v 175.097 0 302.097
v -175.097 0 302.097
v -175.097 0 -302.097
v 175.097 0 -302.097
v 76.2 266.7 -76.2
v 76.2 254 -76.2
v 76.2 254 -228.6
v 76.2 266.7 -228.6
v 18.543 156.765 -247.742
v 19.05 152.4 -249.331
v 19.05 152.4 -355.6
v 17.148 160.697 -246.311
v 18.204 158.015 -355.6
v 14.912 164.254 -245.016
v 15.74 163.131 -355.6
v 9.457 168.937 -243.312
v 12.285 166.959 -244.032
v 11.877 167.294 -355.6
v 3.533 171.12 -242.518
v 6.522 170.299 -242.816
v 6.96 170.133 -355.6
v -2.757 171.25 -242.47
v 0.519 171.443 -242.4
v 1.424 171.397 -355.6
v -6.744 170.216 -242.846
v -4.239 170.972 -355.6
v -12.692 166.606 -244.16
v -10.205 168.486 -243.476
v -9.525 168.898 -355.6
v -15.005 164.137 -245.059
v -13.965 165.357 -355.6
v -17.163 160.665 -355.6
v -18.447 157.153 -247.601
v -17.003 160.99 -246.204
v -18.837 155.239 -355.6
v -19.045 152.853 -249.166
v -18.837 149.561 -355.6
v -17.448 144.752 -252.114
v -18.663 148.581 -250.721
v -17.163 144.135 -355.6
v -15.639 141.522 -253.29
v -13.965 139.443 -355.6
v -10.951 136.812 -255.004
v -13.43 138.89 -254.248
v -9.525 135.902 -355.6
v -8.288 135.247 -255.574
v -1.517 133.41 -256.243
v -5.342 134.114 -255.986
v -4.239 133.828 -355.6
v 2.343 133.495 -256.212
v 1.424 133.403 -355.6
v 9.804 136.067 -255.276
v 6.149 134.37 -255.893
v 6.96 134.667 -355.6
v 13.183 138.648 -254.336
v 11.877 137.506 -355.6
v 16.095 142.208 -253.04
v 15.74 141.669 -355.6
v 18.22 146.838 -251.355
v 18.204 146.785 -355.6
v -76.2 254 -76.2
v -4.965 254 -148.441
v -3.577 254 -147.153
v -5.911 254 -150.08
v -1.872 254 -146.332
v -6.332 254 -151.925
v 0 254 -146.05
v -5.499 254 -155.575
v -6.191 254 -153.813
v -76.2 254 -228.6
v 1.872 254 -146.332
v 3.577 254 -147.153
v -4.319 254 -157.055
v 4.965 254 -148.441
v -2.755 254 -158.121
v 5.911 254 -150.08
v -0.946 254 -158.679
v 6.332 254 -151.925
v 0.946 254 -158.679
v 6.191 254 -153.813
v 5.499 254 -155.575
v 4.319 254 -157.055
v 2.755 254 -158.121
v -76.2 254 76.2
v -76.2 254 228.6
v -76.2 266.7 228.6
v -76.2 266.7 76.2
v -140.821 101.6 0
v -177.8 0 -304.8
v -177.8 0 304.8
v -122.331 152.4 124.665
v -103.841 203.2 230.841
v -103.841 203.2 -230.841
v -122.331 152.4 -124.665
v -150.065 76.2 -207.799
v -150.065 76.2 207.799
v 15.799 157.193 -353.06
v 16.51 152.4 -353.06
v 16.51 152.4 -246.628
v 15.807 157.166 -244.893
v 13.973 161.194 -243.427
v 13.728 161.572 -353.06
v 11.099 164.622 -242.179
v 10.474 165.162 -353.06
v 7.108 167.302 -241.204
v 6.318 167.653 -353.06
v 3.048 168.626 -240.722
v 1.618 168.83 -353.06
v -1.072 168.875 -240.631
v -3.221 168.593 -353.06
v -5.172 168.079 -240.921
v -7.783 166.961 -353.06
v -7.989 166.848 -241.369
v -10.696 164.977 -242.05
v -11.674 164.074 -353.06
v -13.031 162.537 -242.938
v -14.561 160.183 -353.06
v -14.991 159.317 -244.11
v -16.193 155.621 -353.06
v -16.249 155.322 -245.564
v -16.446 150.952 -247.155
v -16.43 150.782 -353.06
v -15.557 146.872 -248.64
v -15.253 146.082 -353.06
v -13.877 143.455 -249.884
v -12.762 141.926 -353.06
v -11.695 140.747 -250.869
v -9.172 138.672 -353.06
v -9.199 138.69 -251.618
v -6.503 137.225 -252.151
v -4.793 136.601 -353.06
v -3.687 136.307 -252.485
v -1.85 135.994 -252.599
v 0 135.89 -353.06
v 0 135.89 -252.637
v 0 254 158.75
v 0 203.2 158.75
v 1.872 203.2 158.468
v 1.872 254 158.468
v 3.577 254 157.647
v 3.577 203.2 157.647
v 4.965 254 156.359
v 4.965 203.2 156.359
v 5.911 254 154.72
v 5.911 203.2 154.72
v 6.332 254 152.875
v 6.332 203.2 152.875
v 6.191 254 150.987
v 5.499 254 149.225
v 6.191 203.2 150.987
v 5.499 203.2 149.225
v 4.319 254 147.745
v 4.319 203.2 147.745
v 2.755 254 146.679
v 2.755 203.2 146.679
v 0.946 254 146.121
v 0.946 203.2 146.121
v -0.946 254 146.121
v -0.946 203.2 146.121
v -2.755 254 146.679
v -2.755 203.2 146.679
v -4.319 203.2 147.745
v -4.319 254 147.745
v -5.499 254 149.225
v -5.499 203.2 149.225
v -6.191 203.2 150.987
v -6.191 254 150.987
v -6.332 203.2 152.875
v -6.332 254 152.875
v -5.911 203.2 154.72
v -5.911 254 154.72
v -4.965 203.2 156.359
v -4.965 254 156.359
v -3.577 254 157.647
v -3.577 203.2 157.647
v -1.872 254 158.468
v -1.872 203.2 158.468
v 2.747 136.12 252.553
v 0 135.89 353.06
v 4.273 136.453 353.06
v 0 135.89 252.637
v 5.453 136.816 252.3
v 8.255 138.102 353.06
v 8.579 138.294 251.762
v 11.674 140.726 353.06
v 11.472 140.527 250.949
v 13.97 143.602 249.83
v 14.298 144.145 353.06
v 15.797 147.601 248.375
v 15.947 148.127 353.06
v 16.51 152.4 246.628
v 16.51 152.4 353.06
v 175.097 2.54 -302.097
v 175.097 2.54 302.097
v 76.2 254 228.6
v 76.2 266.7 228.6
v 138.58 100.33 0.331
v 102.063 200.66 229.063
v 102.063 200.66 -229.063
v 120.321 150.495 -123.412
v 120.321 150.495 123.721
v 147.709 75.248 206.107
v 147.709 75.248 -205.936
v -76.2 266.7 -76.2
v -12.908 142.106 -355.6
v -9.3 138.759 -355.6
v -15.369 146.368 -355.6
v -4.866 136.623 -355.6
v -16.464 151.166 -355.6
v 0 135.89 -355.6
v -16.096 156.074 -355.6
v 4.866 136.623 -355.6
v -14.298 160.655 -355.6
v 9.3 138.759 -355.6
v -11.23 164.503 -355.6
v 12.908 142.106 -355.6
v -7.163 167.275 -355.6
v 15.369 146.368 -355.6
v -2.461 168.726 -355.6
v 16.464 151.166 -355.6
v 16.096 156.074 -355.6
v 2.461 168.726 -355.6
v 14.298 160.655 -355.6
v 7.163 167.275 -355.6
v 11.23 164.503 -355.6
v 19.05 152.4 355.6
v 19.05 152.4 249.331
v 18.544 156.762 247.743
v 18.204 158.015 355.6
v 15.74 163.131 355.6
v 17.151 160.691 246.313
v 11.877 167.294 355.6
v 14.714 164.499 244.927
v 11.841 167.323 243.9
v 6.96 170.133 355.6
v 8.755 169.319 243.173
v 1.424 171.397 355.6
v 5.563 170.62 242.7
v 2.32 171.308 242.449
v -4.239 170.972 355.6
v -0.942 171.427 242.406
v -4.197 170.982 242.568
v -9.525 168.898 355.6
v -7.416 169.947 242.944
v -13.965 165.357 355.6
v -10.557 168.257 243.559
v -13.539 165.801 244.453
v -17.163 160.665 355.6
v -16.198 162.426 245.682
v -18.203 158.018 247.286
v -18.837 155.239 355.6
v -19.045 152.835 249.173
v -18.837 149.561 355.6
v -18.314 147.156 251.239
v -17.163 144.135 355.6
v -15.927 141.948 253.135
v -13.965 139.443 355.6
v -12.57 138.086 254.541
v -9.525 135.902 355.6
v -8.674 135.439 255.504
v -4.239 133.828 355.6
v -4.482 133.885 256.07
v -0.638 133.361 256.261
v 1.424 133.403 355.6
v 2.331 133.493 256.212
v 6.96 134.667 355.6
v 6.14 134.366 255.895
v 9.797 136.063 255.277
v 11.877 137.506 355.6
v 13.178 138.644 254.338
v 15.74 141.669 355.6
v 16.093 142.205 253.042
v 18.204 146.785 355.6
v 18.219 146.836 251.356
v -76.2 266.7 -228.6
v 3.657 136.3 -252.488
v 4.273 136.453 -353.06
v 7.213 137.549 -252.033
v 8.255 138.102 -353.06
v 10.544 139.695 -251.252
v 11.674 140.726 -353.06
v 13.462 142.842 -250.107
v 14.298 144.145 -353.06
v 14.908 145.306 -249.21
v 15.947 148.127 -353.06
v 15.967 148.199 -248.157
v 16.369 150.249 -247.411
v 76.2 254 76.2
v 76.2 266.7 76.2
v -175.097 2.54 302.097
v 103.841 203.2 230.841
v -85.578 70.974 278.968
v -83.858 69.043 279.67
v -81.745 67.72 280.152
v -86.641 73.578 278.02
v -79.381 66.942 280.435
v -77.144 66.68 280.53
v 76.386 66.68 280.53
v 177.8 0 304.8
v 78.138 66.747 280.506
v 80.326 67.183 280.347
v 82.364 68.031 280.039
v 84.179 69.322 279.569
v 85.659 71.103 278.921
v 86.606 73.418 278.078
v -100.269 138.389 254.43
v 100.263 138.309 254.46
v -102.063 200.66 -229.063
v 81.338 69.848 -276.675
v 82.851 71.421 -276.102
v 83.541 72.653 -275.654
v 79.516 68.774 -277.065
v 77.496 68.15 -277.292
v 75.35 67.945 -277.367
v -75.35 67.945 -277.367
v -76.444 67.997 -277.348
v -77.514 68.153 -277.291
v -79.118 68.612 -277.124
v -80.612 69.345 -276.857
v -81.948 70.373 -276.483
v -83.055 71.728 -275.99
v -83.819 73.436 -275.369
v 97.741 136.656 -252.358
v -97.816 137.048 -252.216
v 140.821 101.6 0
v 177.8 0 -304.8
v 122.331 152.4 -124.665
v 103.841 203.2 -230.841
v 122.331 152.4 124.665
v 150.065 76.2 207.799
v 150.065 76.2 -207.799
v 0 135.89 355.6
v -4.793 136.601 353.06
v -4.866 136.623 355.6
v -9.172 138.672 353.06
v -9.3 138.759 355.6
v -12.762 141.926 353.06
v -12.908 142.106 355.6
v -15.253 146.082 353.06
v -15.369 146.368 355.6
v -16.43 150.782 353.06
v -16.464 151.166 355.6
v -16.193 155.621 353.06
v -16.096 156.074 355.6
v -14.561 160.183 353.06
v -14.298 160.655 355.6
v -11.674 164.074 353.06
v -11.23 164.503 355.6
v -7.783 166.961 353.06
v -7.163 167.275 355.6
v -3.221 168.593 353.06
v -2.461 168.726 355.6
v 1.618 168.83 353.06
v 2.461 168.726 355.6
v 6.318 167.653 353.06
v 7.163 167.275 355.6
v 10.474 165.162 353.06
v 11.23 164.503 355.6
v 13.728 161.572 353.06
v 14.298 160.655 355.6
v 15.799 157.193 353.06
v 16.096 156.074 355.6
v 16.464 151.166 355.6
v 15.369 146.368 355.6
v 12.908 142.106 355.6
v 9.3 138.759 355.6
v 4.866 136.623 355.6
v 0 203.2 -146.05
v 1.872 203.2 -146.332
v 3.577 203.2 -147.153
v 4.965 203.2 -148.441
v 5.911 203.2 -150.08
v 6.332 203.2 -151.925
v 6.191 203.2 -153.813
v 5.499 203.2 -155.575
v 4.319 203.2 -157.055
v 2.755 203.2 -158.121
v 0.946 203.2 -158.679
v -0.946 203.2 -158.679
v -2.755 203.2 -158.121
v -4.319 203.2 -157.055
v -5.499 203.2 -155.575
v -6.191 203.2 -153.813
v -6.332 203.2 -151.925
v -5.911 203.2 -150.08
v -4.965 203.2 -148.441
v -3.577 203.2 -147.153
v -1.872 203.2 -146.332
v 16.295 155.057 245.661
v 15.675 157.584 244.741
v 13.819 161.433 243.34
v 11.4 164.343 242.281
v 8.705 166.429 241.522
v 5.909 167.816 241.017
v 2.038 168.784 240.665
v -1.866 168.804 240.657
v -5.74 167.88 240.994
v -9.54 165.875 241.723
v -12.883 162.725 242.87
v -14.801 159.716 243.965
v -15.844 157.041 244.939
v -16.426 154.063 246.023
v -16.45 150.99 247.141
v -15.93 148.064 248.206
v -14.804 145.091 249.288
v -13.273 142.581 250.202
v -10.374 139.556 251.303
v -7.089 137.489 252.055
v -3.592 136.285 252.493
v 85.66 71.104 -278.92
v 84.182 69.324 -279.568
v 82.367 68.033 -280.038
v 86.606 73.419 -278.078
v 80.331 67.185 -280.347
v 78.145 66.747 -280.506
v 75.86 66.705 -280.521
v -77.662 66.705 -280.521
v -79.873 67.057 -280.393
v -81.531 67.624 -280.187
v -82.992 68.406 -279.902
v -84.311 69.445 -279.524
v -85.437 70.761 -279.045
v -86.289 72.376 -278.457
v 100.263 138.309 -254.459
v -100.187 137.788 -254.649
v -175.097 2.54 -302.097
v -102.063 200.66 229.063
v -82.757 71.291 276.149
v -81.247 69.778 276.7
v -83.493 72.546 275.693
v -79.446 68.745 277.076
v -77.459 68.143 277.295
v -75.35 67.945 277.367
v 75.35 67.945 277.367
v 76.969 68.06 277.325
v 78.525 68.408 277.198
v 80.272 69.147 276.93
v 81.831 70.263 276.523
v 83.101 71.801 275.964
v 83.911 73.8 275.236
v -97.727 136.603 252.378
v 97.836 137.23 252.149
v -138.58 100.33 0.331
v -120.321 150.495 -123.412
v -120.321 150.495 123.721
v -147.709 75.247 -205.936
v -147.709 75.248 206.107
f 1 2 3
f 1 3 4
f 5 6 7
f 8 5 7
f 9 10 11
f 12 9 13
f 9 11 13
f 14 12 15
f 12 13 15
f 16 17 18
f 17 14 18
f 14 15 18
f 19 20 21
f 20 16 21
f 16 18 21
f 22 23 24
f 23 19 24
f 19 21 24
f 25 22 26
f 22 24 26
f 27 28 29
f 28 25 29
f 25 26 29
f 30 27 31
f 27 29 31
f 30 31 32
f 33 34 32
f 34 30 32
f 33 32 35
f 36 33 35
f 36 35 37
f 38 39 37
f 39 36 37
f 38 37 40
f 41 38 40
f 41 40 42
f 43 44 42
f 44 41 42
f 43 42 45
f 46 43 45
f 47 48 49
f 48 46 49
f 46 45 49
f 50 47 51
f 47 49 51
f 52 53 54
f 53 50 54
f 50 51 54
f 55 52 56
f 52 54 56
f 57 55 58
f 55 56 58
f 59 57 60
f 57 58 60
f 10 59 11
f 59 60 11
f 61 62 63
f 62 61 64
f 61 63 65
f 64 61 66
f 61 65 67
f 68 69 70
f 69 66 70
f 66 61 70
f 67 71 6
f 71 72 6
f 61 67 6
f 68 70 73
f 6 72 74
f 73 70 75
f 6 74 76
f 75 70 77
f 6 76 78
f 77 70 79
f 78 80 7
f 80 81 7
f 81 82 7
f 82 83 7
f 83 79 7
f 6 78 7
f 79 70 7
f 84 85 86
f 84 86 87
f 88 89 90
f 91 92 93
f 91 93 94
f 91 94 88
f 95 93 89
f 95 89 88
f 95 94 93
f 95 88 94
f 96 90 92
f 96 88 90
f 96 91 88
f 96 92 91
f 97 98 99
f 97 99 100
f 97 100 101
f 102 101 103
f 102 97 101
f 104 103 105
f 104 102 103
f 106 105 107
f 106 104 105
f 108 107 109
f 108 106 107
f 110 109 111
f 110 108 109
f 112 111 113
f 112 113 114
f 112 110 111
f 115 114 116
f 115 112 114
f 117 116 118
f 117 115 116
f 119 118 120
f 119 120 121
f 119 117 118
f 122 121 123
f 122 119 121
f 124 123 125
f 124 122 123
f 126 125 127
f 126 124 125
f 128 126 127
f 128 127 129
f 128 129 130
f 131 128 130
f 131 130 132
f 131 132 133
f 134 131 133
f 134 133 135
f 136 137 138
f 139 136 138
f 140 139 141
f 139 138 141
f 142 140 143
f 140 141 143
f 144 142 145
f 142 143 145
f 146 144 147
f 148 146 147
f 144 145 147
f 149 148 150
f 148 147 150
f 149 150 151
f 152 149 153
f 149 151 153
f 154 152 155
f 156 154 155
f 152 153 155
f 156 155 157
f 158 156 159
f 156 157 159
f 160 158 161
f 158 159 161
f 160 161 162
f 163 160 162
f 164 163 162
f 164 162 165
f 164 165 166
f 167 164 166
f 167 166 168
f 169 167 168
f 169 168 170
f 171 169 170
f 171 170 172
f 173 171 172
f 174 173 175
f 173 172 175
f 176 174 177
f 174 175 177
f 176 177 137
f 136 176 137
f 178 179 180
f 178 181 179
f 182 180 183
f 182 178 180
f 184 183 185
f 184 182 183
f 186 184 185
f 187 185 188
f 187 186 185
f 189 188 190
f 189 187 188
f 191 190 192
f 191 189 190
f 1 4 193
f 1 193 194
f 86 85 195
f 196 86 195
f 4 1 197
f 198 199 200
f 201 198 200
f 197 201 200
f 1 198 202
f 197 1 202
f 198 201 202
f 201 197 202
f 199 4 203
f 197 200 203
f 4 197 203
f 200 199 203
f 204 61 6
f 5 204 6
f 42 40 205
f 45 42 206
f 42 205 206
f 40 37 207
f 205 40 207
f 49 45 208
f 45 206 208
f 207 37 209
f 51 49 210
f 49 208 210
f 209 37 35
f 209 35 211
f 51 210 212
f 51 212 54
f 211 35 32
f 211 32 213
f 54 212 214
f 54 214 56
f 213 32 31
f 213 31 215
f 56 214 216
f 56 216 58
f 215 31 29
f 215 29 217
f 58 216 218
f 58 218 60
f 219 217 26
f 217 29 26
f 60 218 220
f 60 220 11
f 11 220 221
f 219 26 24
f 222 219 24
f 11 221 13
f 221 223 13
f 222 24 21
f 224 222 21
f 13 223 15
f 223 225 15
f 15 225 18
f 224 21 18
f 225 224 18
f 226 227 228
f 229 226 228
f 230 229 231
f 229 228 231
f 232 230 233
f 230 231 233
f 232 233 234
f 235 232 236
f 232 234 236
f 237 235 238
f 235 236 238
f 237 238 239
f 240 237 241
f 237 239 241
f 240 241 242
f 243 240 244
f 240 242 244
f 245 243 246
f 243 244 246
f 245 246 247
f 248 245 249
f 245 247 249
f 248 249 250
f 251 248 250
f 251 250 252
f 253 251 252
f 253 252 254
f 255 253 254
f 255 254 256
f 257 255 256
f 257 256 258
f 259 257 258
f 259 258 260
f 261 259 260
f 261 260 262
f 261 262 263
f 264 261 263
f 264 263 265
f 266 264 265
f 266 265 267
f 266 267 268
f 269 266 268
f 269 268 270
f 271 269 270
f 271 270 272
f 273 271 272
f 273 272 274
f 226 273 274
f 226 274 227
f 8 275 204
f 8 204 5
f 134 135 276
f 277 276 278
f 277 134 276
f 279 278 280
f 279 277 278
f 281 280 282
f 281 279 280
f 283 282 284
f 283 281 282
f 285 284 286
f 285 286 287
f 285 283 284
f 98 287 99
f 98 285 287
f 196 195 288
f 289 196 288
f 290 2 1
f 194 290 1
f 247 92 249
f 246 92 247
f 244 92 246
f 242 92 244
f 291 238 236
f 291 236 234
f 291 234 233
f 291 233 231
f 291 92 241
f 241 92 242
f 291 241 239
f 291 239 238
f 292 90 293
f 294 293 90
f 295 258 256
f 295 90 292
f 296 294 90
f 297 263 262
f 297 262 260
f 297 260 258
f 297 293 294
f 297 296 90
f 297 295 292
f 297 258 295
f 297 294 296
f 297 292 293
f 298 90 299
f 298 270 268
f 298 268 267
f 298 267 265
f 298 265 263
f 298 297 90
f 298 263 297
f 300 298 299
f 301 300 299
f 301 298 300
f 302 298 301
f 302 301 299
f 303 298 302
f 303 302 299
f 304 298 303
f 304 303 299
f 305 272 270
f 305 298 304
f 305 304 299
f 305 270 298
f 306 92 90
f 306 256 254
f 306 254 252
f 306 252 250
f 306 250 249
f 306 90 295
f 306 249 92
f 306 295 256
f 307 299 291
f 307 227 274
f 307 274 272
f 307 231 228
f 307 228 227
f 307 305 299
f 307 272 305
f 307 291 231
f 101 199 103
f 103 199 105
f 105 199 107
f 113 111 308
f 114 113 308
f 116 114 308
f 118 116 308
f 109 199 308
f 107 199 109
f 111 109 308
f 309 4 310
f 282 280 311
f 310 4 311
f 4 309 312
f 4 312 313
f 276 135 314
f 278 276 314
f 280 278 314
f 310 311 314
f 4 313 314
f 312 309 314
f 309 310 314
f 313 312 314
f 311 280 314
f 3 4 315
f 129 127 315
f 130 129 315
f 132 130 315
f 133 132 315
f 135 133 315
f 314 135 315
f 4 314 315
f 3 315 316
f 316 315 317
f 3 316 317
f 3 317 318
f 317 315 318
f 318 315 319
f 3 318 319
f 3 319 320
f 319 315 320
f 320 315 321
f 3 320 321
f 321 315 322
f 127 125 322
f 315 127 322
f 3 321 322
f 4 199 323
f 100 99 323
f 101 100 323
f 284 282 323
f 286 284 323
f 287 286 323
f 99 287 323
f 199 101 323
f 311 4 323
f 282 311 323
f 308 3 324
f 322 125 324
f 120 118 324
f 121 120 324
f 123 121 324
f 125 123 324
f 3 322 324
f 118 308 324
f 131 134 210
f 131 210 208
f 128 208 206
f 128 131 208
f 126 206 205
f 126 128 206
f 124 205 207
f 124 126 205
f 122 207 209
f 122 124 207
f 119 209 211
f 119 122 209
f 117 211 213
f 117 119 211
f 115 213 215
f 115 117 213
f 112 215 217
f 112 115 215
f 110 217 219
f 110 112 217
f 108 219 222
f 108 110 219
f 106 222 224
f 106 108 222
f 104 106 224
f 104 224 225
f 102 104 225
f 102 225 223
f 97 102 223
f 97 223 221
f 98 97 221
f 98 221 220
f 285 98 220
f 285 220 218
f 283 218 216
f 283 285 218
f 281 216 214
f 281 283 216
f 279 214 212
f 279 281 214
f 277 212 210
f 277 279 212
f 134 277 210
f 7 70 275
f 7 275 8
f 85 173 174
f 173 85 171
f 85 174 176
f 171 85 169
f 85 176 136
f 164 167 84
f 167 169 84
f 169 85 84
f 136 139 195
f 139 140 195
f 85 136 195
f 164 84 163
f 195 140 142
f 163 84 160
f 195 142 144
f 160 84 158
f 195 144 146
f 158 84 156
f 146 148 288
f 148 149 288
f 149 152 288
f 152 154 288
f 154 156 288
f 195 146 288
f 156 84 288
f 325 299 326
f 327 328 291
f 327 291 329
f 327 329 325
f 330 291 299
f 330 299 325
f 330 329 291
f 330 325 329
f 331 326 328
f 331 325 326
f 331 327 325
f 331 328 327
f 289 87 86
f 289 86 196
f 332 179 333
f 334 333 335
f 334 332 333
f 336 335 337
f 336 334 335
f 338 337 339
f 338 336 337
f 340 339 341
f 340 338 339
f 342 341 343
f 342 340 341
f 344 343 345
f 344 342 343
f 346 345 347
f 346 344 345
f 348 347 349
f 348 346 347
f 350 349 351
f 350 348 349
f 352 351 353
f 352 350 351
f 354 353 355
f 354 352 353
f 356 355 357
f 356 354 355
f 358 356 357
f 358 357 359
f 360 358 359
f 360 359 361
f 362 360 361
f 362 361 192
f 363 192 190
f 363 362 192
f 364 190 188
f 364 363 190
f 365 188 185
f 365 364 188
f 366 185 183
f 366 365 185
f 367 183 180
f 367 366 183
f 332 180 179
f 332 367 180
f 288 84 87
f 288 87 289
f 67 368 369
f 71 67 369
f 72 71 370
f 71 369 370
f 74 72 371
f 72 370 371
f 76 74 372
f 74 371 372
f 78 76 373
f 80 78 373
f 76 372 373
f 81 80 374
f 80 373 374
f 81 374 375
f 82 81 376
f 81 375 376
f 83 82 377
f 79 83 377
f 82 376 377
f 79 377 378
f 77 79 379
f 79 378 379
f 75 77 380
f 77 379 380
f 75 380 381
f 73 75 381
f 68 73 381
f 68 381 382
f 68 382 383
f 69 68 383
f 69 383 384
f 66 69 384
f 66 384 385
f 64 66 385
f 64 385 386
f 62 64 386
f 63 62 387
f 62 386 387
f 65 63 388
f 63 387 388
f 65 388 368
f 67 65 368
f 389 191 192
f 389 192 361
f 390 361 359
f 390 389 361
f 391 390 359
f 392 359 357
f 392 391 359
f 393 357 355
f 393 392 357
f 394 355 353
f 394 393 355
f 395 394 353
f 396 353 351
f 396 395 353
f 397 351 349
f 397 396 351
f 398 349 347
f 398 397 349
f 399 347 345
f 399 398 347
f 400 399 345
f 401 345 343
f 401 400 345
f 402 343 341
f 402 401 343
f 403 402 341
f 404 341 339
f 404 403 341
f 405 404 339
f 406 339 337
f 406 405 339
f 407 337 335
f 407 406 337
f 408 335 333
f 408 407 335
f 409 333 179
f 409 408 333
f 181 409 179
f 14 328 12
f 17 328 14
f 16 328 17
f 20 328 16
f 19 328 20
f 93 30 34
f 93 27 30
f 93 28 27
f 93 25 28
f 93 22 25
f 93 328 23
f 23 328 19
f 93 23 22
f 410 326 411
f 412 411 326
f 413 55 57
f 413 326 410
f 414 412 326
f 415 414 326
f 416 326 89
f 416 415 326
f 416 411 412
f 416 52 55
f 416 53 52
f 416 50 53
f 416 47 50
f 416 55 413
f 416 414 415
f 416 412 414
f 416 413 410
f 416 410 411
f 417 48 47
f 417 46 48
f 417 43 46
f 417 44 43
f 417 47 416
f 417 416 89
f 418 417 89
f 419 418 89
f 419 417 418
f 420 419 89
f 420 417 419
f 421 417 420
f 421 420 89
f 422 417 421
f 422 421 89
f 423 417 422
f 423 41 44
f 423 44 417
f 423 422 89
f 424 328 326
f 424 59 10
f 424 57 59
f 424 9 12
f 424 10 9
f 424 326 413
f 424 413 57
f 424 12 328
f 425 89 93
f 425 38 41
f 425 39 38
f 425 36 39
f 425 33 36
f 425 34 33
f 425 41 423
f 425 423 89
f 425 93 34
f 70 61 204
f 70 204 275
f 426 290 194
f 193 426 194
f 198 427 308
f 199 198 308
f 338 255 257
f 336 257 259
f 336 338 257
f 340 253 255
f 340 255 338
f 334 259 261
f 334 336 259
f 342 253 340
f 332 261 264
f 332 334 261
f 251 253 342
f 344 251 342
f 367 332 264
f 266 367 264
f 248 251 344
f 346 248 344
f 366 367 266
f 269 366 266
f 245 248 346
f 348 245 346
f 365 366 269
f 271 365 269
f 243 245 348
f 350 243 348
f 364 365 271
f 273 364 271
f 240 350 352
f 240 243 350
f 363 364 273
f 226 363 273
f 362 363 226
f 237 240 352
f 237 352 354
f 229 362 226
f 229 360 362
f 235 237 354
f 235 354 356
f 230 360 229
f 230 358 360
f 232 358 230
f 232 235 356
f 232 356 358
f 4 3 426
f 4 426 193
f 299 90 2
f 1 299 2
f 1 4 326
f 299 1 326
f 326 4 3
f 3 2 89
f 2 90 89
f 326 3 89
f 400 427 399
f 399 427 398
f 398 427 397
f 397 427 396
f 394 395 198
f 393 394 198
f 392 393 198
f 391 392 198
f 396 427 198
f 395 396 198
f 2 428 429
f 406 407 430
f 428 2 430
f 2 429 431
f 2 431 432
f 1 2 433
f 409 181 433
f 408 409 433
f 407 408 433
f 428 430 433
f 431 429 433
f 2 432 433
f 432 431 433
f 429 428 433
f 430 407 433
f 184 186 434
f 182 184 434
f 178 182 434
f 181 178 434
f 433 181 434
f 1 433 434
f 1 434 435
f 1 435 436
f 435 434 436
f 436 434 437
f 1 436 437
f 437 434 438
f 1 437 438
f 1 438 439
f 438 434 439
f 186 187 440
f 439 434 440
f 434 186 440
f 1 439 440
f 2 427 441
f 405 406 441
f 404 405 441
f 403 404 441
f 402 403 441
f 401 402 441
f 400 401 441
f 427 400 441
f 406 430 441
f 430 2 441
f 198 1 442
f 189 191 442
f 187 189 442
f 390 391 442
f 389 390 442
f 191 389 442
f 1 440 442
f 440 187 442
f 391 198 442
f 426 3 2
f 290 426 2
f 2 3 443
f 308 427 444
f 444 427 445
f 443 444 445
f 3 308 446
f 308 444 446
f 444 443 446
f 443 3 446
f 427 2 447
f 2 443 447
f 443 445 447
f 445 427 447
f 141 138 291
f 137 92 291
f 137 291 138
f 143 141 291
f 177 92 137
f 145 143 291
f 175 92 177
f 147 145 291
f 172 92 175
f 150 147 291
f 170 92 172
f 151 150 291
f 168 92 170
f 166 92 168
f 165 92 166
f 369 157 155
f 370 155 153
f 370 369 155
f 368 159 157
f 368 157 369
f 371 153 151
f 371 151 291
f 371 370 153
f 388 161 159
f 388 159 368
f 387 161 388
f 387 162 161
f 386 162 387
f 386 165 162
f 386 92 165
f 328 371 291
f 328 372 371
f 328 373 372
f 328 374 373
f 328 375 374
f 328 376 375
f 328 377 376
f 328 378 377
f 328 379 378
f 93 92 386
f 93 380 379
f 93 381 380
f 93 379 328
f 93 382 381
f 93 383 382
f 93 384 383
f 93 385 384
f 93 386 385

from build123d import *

# Parameters (mm, degrees)
SKETCH1_W                = 355.6
SKETCH1_H                = 609.6
BOSS_EXTRUDE1_DEPTH      = 203.2
BOSS_EXTRUDE1_TAPER      = 20
BOSS_EXTRUDE2_DEPTH      = 355.6
BOSS_EXTRUDE2_DEPTH_BACK = 355.6
SKETCH2_R                = 19.05
SKETCH2_R_2              = 12.7
SHELL1_T                 = -2.54
CUT_EXTRUDE1_DEPTH       = 759.354848219
CUT_EXTRUDE1_DEPTH_BACK  = 759.354848219
SKETCH3_R                = 16.51
SKETCH4_R                = 6.35
BOSS_EXTRUDE3_DEPTH      = 50.8
SKETCH5_W                = 152.4
SKETCH5_H                = 152.4
BOSS_EXTRUDE4_DEPTH      = 12.7
SKETCH6_W                = 350.193976916
SKETCH6_H                = 604.193976916
BOSS_EXTRUDE5_DEPTH      = 2.54


with BuildPart() as part:
    # Sketch1 → Boss-Extrude1 (new body)
    with BuildSketch(Plane(origin=(0, 0, 0), x_dir=(1, 0, 0), z_dir=(0, 1, 0))):
        Rectangle(SKETCH1_W, SKETCH1_H)
    extrude(amount=BOSS_EXTRUDE1_DEPTH, taper=BOSS_EXTRUDE1_TAPER)

    # Sketch2 → Boss-Extrude2 (add, two sides: drawn at the far end of the back side and taken through both)
    with BuildSketch(Plane.XY.offset(-BOSS_EXTRUDE2_DEPTH_BACK)):
        with Locations((0, 152.4)):
            Circle(SKETCH2_R)
        with Locations((0, 152.4)):
            Circle(SKETCH2_R_2, mode=Mode.SUBTRACT)
    extrude(amount=BOSS_EXTRUDE2_DEPTH + BOSS_EXTRUDE2_DEPTH_BACK)

    # Shell1
    shell1_openings = [part.faces().sort_by_distance(p)[0] for p in [
        (0, 0, 0),
    ]]
    offset(amount=SHELL1_T, openings=shell1_openings, kind=Kind.INTERSECTION)

    # Sketch3 → Cut-Extrude1 (cut, two sides: drawn at the far end of the back side and taken through both)
    with BuildSketch(Plane(origin=(0, 0, 353.06), x_dir=(-1, 0, 0), z_dir=(0, 0, -1)).offset(-CUT_EXTRUDE1_DEPTH_BACK)):
        with Locations(Location((0, 152.4, 0), (0, 0, 270))):
            Circle(SKETCH3_R)
    extrude(amount=CUT_EXTRUDE1_DEPTH + CUT_EXTRUDE1_DEPTH_BACK, mode=Mode.SUBTRACT)

    # Sketch4 → Boss-Extrude3 (add)
    with BuildSketch(Plane(origin=(0, 203.2, 0), x_dir=(1, 0, 0), z_dir=(0, 1, 0))):
        with Locations(Location((0, 152.4, 0), (0, 0, 270))):
            Circle(SKETCH4_R)
        with Locations(Location((0, -152.4, 0), (0, 0, 270))):
            Circle(SKETCH4_R)
    extrude(amount=BOSS_EXTRUDE3_DEPTH)

    # Sketch5 → Boss-Extrude4 (add)
    with BuildSketch(Plane(origin=(0, 254, 0), x_dir=(1, 0, 0), z_dir=(0, 1, 0))):
        with Locations((0, 152.4)):
            Rectangle(SKETCH5_W, SKETCH5_H)
        with Locations((0, -152.4)):
            Rectangle(SKETCH5_W, SKETCH5_H)
    extrude(amount=BOSS_EXTRUDE4_DEPTH)


with BuildPart() as body_2:
    # Sketch6 → Boss-Extrude5 (new body)
    with BuildSketch(Plane.XZ):
        Rectangle(SKETCH6_W, SKETCH6_H)
    extrude(amount=-BOSS_EXTRUDE5_DEPTH)


solid = Compound([part.part, body_2.part])
